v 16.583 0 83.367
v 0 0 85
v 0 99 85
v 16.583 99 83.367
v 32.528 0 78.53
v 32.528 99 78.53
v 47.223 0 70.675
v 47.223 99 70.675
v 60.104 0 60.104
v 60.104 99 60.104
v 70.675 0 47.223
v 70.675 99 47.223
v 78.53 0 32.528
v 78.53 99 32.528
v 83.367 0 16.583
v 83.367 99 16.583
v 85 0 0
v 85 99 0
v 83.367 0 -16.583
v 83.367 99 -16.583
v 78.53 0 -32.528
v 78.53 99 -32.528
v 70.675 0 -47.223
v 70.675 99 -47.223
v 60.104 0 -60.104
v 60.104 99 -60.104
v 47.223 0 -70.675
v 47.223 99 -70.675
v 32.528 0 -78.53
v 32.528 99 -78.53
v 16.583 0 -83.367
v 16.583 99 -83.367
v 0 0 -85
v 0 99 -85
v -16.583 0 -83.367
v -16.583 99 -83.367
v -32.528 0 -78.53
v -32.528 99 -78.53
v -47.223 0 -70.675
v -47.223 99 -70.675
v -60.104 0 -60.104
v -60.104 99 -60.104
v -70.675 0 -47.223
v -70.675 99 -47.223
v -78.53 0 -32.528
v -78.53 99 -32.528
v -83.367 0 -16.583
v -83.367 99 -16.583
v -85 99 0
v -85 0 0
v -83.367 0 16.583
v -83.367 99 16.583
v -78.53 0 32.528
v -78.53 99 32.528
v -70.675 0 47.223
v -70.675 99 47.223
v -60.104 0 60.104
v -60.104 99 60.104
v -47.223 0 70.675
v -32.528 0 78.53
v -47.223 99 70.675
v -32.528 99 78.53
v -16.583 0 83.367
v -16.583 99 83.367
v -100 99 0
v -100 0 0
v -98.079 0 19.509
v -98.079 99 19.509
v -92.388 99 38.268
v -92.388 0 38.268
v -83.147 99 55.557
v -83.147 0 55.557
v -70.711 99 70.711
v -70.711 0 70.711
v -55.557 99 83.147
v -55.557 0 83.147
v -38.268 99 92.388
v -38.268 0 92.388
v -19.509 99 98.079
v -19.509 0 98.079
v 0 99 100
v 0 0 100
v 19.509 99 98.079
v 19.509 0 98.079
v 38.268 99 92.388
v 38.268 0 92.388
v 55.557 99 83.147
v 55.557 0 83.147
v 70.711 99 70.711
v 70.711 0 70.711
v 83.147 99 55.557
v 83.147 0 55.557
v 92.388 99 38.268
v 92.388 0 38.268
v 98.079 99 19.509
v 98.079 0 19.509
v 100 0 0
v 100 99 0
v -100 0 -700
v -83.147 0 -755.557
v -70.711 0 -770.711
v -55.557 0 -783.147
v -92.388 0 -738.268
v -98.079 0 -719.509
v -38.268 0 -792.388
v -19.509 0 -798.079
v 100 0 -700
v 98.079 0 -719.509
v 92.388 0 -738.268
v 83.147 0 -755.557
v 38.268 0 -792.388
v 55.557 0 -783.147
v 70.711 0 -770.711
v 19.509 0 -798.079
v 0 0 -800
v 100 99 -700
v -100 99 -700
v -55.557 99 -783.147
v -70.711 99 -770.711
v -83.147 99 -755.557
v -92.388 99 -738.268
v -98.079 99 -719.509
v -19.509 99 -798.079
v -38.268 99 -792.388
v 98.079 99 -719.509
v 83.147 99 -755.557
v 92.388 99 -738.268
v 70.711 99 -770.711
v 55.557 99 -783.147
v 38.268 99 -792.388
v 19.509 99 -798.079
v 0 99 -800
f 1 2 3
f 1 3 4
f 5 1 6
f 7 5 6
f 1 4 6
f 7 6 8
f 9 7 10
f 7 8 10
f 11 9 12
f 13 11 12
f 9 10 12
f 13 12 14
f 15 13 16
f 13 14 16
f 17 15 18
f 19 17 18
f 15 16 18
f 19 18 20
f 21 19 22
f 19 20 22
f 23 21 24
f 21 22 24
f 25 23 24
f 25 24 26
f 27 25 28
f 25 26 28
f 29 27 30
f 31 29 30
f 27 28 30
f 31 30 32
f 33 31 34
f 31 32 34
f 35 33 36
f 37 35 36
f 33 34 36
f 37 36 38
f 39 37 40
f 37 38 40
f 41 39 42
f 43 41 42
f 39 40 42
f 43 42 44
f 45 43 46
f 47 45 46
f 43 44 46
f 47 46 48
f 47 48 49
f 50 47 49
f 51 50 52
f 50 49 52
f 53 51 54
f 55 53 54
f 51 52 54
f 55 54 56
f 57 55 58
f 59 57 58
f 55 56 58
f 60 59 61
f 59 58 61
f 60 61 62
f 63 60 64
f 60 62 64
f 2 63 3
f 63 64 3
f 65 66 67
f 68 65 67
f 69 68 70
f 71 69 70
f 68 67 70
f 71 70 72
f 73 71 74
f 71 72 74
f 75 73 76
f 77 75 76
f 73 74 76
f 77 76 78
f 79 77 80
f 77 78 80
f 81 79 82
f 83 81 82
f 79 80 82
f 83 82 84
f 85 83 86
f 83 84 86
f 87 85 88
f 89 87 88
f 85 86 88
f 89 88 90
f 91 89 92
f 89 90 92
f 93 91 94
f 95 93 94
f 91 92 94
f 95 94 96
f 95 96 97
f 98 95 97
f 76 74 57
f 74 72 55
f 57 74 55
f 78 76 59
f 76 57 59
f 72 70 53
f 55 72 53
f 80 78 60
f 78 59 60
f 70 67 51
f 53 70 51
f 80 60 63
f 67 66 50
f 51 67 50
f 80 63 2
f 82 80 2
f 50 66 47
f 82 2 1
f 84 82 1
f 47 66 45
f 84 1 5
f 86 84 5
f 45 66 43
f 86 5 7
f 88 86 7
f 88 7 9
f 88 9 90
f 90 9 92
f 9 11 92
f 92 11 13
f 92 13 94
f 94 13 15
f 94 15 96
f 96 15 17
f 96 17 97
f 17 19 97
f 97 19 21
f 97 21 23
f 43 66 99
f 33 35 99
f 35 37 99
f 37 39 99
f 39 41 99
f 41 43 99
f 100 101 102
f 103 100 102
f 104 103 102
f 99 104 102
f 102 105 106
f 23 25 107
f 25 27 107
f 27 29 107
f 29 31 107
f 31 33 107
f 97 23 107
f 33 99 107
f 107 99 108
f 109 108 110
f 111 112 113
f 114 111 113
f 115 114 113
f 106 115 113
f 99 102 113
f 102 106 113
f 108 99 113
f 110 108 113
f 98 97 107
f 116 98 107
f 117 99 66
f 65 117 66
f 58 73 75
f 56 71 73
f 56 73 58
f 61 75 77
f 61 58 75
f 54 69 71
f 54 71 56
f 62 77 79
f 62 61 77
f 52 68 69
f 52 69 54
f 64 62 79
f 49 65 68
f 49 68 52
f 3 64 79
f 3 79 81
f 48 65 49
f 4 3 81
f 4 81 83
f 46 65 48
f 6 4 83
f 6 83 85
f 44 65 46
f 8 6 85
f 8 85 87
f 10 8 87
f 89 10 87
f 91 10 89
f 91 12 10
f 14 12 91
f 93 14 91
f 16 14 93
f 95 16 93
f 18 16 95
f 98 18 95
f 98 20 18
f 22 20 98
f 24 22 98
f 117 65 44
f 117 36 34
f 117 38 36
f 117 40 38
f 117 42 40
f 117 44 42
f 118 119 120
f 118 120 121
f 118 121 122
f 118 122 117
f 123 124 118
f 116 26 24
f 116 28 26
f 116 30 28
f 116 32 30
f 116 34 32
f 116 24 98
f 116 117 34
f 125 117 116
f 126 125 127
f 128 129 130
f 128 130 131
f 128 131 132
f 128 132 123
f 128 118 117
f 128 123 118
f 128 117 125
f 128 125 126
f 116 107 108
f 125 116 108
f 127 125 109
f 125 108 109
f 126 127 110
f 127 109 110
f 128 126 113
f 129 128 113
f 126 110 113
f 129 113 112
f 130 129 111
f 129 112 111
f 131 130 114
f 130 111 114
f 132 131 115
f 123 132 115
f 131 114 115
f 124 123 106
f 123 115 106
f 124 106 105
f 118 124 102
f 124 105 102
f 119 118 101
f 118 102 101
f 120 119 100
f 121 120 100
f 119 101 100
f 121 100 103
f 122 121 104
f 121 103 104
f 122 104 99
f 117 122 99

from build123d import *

# Parameters (mm, degrees)
BOSS_EXTRUDE1_DEPTH = 99
SKETCH2_R           = 85
CUT_EXTRUDE1_DEPTH  = 99


with BuildPart() as part:
    # Sketch1 → Boss-Extrude1 (new body)
    with BuildSketch(Plane(origin=(0, 0, 0), x_dir=(1, 0, 0), z_dir=(0, 1, 0))):
        with BuildLine():
            ThreePointArc((-100, 0), (0, -100), (100, 0))
            Line((100, 0), (-100, 0))
        make_face()
        with BuildLine():
            Line((-100, 0), (100, 0))
            ThreePointArc((100, 0), (0, 100), (-100, 0))
        make_face()
        with BuildLine():
            ThreePointArc((-100, 0), (0, 100), (100, 0))
            Line((100, 0), (100, 700))
            ThreePointArc((100, 700), (0, 600), (-100, 700))
            Line((-100, 700), (-100, 0))
        make_face()
        with BuildLine():
            ThreePointArc((-100, 700), (0, 600), (100, 700))
            Line((100, 700), (-100, 700))
        make_face()
        with BuildLine():
            Line((-100, 700), (100, 700))
            ThreePointArc((100, 700), (0, 800), (-100, 700))
        make_face()
    extrude(amount=BOSS_EXTRUDE1_DEPTH)

    # Sketch2 → Cut-Extrude1 (cut)
    with BuildSketch(Plane(origin=(0, 99, 0), x_dir=(1, 0, 0), z_dir=(0, 1, 0))):
        with Locations(Location((0, 0, 0), (0, 0, 270))):
            Circle(SKETCH2_R)
    extrude(amount=-CUT_EXTRUDE1_DEPTH, mode=Mode.SUBTRACT)


solid = part.part
